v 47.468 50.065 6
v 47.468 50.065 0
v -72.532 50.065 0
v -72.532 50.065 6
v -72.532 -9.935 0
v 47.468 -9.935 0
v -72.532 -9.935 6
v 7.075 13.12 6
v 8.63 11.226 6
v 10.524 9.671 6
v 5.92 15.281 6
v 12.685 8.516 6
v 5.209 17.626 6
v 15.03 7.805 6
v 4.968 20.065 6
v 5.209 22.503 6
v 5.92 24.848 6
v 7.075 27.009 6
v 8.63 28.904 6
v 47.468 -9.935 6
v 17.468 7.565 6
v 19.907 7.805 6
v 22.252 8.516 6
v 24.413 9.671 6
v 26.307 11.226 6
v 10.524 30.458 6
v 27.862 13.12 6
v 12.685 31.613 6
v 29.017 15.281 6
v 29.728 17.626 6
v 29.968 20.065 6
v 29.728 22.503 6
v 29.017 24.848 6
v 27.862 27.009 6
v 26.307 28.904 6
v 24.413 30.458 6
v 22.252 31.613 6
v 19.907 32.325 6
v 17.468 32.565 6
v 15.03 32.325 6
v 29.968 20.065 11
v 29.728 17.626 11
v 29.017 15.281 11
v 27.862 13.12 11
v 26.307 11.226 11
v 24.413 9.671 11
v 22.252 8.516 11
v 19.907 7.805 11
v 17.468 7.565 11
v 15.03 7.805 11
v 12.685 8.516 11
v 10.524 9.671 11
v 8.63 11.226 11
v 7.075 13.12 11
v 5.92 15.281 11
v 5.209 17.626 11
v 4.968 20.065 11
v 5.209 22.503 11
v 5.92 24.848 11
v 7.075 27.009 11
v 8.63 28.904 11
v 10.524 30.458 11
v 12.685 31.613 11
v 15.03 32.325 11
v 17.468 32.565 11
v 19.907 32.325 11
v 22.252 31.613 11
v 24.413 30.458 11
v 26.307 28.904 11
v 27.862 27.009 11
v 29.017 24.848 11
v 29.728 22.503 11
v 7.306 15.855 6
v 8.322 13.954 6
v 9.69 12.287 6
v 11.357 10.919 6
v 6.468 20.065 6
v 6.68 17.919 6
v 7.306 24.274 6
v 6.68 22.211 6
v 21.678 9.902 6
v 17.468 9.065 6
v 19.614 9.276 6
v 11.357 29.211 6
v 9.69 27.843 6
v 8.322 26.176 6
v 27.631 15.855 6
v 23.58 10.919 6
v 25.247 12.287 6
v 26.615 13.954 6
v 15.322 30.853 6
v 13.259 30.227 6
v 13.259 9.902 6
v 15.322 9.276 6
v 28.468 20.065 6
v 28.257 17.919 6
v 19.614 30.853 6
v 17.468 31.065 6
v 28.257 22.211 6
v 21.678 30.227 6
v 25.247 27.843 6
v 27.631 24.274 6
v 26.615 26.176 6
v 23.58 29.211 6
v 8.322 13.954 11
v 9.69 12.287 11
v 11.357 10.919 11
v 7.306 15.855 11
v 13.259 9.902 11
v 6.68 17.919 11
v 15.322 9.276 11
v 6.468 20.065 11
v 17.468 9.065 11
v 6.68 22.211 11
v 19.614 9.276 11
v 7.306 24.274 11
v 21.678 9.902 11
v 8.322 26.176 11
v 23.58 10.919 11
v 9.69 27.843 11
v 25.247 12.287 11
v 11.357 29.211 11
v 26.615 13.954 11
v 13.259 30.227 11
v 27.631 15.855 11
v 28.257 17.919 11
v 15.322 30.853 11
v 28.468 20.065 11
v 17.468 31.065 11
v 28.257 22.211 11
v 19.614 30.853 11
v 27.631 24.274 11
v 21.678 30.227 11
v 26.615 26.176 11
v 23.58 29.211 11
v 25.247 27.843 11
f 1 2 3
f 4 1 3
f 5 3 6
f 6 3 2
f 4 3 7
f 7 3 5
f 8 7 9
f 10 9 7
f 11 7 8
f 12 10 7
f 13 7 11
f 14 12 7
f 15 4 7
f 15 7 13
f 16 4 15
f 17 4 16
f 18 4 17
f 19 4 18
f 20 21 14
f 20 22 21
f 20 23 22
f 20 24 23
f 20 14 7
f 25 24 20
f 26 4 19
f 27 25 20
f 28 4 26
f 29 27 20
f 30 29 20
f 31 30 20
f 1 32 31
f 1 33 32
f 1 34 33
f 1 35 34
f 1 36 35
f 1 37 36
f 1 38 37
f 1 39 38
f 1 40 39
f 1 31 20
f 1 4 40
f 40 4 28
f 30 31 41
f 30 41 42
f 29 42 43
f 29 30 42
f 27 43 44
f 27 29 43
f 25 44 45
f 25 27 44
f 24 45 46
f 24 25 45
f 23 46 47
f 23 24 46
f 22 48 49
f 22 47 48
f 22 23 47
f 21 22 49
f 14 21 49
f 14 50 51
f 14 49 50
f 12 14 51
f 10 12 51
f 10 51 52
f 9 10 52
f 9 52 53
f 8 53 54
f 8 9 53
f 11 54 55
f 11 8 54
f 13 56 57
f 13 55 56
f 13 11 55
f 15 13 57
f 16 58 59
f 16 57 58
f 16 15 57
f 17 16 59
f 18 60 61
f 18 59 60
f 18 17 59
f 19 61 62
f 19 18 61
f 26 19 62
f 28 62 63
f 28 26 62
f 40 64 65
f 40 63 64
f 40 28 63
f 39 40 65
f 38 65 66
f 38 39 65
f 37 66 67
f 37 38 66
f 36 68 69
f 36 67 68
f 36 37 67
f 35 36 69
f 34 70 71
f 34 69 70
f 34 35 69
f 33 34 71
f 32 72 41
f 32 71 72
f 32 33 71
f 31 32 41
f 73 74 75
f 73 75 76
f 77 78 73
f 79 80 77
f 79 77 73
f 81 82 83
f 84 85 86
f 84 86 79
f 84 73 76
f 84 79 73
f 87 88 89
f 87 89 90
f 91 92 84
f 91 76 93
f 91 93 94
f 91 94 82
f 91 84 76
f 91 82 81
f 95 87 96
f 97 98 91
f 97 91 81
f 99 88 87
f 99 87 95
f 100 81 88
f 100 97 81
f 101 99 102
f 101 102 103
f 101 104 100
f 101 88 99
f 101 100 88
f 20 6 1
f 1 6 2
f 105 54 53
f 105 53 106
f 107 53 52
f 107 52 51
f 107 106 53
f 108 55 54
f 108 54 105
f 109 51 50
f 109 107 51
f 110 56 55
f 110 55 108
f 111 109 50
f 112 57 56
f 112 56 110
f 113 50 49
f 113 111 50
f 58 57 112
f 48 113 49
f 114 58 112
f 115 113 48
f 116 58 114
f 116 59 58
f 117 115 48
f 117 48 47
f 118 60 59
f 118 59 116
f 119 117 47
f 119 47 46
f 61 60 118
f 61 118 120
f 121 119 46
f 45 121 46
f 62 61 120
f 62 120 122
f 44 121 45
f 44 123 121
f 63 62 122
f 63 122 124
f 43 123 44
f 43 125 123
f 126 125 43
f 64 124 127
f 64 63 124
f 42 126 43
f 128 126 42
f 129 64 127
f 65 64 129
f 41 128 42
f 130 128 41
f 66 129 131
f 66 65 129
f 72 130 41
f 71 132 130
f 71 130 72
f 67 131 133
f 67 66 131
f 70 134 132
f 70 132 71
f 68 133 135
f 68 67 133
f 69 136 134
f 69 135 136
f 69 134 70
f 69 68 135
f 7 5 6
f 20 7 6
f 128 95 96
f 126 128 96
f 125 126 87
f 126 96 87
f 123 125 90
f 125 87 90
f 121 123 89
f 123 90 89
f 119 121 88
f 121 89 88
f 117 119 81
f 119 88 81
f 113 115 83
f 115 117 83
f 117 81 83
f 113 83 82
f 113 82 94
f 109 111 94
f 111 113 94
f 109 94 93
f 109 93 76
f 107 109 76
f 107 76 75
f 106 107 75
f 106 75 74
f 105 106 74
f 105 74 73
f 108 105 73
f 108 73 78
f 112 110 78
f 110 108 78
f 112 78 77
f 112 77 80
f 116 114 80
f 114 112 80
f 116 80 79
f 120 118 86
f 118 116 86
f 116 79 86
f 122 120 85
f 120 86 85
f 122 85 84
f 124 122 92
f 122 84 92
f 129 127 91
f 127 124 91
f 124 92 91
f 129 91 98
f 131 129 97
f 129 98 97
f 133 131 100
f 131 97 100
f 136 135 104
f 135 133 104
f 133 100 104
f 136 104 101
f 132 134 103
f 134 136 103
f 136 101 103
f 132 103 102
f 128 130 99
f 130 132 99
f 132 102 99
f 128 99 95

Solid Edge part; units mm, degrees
sketch "Sketch1" plane through (0, 0, 0) normal (0, 0, 1) x (1, 0, 0)
  line L0 (-72.5316, -9.9352) -> (47.4684, -9.9352)
  line L1 (47.4684, -9.9352) -> (47.4684, 50.0648)
  line L2 (47.4684, 50.0648) -> (-72.5316, 50.0648)
  line L3 (-72.5316, 50.0648) -> (-72.5316, -9.9352)
  dimension "D1" = 120
  dimension "D2" = 60
extrude "Protrusion1" add sketch "Sketch1" along normal blind 6
sketch "Sketch2" plane through (-52.5316, 30.0648, 6) normal (0, 0, 1) x (1, 0, 0)
  circle A0 centre (70, -10) radius 12.5
  circle A1 centre (70, -10) radius 11
  dimension "D1" = 22
  dimension "D2" = 25
  dimension "D3" = 30
  dimension "D4" = 30
extrude "ExtrudedProtrusion_2" add sketch "Sketch2" along normal blind 5
